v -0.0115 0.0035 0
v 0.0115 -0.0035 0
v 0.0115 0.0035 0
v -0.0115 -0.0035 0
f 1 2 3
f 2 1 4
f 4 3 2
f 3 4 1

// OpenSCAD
fto_thickness = 250e-9;
fto_x = 2.3e-2;
fto_y = 0.7e-2;

//cube([fto_x,fto_y,fto_thickness],center=true);

cube([fto_x,fto_y,fto_thickness],center=true);
